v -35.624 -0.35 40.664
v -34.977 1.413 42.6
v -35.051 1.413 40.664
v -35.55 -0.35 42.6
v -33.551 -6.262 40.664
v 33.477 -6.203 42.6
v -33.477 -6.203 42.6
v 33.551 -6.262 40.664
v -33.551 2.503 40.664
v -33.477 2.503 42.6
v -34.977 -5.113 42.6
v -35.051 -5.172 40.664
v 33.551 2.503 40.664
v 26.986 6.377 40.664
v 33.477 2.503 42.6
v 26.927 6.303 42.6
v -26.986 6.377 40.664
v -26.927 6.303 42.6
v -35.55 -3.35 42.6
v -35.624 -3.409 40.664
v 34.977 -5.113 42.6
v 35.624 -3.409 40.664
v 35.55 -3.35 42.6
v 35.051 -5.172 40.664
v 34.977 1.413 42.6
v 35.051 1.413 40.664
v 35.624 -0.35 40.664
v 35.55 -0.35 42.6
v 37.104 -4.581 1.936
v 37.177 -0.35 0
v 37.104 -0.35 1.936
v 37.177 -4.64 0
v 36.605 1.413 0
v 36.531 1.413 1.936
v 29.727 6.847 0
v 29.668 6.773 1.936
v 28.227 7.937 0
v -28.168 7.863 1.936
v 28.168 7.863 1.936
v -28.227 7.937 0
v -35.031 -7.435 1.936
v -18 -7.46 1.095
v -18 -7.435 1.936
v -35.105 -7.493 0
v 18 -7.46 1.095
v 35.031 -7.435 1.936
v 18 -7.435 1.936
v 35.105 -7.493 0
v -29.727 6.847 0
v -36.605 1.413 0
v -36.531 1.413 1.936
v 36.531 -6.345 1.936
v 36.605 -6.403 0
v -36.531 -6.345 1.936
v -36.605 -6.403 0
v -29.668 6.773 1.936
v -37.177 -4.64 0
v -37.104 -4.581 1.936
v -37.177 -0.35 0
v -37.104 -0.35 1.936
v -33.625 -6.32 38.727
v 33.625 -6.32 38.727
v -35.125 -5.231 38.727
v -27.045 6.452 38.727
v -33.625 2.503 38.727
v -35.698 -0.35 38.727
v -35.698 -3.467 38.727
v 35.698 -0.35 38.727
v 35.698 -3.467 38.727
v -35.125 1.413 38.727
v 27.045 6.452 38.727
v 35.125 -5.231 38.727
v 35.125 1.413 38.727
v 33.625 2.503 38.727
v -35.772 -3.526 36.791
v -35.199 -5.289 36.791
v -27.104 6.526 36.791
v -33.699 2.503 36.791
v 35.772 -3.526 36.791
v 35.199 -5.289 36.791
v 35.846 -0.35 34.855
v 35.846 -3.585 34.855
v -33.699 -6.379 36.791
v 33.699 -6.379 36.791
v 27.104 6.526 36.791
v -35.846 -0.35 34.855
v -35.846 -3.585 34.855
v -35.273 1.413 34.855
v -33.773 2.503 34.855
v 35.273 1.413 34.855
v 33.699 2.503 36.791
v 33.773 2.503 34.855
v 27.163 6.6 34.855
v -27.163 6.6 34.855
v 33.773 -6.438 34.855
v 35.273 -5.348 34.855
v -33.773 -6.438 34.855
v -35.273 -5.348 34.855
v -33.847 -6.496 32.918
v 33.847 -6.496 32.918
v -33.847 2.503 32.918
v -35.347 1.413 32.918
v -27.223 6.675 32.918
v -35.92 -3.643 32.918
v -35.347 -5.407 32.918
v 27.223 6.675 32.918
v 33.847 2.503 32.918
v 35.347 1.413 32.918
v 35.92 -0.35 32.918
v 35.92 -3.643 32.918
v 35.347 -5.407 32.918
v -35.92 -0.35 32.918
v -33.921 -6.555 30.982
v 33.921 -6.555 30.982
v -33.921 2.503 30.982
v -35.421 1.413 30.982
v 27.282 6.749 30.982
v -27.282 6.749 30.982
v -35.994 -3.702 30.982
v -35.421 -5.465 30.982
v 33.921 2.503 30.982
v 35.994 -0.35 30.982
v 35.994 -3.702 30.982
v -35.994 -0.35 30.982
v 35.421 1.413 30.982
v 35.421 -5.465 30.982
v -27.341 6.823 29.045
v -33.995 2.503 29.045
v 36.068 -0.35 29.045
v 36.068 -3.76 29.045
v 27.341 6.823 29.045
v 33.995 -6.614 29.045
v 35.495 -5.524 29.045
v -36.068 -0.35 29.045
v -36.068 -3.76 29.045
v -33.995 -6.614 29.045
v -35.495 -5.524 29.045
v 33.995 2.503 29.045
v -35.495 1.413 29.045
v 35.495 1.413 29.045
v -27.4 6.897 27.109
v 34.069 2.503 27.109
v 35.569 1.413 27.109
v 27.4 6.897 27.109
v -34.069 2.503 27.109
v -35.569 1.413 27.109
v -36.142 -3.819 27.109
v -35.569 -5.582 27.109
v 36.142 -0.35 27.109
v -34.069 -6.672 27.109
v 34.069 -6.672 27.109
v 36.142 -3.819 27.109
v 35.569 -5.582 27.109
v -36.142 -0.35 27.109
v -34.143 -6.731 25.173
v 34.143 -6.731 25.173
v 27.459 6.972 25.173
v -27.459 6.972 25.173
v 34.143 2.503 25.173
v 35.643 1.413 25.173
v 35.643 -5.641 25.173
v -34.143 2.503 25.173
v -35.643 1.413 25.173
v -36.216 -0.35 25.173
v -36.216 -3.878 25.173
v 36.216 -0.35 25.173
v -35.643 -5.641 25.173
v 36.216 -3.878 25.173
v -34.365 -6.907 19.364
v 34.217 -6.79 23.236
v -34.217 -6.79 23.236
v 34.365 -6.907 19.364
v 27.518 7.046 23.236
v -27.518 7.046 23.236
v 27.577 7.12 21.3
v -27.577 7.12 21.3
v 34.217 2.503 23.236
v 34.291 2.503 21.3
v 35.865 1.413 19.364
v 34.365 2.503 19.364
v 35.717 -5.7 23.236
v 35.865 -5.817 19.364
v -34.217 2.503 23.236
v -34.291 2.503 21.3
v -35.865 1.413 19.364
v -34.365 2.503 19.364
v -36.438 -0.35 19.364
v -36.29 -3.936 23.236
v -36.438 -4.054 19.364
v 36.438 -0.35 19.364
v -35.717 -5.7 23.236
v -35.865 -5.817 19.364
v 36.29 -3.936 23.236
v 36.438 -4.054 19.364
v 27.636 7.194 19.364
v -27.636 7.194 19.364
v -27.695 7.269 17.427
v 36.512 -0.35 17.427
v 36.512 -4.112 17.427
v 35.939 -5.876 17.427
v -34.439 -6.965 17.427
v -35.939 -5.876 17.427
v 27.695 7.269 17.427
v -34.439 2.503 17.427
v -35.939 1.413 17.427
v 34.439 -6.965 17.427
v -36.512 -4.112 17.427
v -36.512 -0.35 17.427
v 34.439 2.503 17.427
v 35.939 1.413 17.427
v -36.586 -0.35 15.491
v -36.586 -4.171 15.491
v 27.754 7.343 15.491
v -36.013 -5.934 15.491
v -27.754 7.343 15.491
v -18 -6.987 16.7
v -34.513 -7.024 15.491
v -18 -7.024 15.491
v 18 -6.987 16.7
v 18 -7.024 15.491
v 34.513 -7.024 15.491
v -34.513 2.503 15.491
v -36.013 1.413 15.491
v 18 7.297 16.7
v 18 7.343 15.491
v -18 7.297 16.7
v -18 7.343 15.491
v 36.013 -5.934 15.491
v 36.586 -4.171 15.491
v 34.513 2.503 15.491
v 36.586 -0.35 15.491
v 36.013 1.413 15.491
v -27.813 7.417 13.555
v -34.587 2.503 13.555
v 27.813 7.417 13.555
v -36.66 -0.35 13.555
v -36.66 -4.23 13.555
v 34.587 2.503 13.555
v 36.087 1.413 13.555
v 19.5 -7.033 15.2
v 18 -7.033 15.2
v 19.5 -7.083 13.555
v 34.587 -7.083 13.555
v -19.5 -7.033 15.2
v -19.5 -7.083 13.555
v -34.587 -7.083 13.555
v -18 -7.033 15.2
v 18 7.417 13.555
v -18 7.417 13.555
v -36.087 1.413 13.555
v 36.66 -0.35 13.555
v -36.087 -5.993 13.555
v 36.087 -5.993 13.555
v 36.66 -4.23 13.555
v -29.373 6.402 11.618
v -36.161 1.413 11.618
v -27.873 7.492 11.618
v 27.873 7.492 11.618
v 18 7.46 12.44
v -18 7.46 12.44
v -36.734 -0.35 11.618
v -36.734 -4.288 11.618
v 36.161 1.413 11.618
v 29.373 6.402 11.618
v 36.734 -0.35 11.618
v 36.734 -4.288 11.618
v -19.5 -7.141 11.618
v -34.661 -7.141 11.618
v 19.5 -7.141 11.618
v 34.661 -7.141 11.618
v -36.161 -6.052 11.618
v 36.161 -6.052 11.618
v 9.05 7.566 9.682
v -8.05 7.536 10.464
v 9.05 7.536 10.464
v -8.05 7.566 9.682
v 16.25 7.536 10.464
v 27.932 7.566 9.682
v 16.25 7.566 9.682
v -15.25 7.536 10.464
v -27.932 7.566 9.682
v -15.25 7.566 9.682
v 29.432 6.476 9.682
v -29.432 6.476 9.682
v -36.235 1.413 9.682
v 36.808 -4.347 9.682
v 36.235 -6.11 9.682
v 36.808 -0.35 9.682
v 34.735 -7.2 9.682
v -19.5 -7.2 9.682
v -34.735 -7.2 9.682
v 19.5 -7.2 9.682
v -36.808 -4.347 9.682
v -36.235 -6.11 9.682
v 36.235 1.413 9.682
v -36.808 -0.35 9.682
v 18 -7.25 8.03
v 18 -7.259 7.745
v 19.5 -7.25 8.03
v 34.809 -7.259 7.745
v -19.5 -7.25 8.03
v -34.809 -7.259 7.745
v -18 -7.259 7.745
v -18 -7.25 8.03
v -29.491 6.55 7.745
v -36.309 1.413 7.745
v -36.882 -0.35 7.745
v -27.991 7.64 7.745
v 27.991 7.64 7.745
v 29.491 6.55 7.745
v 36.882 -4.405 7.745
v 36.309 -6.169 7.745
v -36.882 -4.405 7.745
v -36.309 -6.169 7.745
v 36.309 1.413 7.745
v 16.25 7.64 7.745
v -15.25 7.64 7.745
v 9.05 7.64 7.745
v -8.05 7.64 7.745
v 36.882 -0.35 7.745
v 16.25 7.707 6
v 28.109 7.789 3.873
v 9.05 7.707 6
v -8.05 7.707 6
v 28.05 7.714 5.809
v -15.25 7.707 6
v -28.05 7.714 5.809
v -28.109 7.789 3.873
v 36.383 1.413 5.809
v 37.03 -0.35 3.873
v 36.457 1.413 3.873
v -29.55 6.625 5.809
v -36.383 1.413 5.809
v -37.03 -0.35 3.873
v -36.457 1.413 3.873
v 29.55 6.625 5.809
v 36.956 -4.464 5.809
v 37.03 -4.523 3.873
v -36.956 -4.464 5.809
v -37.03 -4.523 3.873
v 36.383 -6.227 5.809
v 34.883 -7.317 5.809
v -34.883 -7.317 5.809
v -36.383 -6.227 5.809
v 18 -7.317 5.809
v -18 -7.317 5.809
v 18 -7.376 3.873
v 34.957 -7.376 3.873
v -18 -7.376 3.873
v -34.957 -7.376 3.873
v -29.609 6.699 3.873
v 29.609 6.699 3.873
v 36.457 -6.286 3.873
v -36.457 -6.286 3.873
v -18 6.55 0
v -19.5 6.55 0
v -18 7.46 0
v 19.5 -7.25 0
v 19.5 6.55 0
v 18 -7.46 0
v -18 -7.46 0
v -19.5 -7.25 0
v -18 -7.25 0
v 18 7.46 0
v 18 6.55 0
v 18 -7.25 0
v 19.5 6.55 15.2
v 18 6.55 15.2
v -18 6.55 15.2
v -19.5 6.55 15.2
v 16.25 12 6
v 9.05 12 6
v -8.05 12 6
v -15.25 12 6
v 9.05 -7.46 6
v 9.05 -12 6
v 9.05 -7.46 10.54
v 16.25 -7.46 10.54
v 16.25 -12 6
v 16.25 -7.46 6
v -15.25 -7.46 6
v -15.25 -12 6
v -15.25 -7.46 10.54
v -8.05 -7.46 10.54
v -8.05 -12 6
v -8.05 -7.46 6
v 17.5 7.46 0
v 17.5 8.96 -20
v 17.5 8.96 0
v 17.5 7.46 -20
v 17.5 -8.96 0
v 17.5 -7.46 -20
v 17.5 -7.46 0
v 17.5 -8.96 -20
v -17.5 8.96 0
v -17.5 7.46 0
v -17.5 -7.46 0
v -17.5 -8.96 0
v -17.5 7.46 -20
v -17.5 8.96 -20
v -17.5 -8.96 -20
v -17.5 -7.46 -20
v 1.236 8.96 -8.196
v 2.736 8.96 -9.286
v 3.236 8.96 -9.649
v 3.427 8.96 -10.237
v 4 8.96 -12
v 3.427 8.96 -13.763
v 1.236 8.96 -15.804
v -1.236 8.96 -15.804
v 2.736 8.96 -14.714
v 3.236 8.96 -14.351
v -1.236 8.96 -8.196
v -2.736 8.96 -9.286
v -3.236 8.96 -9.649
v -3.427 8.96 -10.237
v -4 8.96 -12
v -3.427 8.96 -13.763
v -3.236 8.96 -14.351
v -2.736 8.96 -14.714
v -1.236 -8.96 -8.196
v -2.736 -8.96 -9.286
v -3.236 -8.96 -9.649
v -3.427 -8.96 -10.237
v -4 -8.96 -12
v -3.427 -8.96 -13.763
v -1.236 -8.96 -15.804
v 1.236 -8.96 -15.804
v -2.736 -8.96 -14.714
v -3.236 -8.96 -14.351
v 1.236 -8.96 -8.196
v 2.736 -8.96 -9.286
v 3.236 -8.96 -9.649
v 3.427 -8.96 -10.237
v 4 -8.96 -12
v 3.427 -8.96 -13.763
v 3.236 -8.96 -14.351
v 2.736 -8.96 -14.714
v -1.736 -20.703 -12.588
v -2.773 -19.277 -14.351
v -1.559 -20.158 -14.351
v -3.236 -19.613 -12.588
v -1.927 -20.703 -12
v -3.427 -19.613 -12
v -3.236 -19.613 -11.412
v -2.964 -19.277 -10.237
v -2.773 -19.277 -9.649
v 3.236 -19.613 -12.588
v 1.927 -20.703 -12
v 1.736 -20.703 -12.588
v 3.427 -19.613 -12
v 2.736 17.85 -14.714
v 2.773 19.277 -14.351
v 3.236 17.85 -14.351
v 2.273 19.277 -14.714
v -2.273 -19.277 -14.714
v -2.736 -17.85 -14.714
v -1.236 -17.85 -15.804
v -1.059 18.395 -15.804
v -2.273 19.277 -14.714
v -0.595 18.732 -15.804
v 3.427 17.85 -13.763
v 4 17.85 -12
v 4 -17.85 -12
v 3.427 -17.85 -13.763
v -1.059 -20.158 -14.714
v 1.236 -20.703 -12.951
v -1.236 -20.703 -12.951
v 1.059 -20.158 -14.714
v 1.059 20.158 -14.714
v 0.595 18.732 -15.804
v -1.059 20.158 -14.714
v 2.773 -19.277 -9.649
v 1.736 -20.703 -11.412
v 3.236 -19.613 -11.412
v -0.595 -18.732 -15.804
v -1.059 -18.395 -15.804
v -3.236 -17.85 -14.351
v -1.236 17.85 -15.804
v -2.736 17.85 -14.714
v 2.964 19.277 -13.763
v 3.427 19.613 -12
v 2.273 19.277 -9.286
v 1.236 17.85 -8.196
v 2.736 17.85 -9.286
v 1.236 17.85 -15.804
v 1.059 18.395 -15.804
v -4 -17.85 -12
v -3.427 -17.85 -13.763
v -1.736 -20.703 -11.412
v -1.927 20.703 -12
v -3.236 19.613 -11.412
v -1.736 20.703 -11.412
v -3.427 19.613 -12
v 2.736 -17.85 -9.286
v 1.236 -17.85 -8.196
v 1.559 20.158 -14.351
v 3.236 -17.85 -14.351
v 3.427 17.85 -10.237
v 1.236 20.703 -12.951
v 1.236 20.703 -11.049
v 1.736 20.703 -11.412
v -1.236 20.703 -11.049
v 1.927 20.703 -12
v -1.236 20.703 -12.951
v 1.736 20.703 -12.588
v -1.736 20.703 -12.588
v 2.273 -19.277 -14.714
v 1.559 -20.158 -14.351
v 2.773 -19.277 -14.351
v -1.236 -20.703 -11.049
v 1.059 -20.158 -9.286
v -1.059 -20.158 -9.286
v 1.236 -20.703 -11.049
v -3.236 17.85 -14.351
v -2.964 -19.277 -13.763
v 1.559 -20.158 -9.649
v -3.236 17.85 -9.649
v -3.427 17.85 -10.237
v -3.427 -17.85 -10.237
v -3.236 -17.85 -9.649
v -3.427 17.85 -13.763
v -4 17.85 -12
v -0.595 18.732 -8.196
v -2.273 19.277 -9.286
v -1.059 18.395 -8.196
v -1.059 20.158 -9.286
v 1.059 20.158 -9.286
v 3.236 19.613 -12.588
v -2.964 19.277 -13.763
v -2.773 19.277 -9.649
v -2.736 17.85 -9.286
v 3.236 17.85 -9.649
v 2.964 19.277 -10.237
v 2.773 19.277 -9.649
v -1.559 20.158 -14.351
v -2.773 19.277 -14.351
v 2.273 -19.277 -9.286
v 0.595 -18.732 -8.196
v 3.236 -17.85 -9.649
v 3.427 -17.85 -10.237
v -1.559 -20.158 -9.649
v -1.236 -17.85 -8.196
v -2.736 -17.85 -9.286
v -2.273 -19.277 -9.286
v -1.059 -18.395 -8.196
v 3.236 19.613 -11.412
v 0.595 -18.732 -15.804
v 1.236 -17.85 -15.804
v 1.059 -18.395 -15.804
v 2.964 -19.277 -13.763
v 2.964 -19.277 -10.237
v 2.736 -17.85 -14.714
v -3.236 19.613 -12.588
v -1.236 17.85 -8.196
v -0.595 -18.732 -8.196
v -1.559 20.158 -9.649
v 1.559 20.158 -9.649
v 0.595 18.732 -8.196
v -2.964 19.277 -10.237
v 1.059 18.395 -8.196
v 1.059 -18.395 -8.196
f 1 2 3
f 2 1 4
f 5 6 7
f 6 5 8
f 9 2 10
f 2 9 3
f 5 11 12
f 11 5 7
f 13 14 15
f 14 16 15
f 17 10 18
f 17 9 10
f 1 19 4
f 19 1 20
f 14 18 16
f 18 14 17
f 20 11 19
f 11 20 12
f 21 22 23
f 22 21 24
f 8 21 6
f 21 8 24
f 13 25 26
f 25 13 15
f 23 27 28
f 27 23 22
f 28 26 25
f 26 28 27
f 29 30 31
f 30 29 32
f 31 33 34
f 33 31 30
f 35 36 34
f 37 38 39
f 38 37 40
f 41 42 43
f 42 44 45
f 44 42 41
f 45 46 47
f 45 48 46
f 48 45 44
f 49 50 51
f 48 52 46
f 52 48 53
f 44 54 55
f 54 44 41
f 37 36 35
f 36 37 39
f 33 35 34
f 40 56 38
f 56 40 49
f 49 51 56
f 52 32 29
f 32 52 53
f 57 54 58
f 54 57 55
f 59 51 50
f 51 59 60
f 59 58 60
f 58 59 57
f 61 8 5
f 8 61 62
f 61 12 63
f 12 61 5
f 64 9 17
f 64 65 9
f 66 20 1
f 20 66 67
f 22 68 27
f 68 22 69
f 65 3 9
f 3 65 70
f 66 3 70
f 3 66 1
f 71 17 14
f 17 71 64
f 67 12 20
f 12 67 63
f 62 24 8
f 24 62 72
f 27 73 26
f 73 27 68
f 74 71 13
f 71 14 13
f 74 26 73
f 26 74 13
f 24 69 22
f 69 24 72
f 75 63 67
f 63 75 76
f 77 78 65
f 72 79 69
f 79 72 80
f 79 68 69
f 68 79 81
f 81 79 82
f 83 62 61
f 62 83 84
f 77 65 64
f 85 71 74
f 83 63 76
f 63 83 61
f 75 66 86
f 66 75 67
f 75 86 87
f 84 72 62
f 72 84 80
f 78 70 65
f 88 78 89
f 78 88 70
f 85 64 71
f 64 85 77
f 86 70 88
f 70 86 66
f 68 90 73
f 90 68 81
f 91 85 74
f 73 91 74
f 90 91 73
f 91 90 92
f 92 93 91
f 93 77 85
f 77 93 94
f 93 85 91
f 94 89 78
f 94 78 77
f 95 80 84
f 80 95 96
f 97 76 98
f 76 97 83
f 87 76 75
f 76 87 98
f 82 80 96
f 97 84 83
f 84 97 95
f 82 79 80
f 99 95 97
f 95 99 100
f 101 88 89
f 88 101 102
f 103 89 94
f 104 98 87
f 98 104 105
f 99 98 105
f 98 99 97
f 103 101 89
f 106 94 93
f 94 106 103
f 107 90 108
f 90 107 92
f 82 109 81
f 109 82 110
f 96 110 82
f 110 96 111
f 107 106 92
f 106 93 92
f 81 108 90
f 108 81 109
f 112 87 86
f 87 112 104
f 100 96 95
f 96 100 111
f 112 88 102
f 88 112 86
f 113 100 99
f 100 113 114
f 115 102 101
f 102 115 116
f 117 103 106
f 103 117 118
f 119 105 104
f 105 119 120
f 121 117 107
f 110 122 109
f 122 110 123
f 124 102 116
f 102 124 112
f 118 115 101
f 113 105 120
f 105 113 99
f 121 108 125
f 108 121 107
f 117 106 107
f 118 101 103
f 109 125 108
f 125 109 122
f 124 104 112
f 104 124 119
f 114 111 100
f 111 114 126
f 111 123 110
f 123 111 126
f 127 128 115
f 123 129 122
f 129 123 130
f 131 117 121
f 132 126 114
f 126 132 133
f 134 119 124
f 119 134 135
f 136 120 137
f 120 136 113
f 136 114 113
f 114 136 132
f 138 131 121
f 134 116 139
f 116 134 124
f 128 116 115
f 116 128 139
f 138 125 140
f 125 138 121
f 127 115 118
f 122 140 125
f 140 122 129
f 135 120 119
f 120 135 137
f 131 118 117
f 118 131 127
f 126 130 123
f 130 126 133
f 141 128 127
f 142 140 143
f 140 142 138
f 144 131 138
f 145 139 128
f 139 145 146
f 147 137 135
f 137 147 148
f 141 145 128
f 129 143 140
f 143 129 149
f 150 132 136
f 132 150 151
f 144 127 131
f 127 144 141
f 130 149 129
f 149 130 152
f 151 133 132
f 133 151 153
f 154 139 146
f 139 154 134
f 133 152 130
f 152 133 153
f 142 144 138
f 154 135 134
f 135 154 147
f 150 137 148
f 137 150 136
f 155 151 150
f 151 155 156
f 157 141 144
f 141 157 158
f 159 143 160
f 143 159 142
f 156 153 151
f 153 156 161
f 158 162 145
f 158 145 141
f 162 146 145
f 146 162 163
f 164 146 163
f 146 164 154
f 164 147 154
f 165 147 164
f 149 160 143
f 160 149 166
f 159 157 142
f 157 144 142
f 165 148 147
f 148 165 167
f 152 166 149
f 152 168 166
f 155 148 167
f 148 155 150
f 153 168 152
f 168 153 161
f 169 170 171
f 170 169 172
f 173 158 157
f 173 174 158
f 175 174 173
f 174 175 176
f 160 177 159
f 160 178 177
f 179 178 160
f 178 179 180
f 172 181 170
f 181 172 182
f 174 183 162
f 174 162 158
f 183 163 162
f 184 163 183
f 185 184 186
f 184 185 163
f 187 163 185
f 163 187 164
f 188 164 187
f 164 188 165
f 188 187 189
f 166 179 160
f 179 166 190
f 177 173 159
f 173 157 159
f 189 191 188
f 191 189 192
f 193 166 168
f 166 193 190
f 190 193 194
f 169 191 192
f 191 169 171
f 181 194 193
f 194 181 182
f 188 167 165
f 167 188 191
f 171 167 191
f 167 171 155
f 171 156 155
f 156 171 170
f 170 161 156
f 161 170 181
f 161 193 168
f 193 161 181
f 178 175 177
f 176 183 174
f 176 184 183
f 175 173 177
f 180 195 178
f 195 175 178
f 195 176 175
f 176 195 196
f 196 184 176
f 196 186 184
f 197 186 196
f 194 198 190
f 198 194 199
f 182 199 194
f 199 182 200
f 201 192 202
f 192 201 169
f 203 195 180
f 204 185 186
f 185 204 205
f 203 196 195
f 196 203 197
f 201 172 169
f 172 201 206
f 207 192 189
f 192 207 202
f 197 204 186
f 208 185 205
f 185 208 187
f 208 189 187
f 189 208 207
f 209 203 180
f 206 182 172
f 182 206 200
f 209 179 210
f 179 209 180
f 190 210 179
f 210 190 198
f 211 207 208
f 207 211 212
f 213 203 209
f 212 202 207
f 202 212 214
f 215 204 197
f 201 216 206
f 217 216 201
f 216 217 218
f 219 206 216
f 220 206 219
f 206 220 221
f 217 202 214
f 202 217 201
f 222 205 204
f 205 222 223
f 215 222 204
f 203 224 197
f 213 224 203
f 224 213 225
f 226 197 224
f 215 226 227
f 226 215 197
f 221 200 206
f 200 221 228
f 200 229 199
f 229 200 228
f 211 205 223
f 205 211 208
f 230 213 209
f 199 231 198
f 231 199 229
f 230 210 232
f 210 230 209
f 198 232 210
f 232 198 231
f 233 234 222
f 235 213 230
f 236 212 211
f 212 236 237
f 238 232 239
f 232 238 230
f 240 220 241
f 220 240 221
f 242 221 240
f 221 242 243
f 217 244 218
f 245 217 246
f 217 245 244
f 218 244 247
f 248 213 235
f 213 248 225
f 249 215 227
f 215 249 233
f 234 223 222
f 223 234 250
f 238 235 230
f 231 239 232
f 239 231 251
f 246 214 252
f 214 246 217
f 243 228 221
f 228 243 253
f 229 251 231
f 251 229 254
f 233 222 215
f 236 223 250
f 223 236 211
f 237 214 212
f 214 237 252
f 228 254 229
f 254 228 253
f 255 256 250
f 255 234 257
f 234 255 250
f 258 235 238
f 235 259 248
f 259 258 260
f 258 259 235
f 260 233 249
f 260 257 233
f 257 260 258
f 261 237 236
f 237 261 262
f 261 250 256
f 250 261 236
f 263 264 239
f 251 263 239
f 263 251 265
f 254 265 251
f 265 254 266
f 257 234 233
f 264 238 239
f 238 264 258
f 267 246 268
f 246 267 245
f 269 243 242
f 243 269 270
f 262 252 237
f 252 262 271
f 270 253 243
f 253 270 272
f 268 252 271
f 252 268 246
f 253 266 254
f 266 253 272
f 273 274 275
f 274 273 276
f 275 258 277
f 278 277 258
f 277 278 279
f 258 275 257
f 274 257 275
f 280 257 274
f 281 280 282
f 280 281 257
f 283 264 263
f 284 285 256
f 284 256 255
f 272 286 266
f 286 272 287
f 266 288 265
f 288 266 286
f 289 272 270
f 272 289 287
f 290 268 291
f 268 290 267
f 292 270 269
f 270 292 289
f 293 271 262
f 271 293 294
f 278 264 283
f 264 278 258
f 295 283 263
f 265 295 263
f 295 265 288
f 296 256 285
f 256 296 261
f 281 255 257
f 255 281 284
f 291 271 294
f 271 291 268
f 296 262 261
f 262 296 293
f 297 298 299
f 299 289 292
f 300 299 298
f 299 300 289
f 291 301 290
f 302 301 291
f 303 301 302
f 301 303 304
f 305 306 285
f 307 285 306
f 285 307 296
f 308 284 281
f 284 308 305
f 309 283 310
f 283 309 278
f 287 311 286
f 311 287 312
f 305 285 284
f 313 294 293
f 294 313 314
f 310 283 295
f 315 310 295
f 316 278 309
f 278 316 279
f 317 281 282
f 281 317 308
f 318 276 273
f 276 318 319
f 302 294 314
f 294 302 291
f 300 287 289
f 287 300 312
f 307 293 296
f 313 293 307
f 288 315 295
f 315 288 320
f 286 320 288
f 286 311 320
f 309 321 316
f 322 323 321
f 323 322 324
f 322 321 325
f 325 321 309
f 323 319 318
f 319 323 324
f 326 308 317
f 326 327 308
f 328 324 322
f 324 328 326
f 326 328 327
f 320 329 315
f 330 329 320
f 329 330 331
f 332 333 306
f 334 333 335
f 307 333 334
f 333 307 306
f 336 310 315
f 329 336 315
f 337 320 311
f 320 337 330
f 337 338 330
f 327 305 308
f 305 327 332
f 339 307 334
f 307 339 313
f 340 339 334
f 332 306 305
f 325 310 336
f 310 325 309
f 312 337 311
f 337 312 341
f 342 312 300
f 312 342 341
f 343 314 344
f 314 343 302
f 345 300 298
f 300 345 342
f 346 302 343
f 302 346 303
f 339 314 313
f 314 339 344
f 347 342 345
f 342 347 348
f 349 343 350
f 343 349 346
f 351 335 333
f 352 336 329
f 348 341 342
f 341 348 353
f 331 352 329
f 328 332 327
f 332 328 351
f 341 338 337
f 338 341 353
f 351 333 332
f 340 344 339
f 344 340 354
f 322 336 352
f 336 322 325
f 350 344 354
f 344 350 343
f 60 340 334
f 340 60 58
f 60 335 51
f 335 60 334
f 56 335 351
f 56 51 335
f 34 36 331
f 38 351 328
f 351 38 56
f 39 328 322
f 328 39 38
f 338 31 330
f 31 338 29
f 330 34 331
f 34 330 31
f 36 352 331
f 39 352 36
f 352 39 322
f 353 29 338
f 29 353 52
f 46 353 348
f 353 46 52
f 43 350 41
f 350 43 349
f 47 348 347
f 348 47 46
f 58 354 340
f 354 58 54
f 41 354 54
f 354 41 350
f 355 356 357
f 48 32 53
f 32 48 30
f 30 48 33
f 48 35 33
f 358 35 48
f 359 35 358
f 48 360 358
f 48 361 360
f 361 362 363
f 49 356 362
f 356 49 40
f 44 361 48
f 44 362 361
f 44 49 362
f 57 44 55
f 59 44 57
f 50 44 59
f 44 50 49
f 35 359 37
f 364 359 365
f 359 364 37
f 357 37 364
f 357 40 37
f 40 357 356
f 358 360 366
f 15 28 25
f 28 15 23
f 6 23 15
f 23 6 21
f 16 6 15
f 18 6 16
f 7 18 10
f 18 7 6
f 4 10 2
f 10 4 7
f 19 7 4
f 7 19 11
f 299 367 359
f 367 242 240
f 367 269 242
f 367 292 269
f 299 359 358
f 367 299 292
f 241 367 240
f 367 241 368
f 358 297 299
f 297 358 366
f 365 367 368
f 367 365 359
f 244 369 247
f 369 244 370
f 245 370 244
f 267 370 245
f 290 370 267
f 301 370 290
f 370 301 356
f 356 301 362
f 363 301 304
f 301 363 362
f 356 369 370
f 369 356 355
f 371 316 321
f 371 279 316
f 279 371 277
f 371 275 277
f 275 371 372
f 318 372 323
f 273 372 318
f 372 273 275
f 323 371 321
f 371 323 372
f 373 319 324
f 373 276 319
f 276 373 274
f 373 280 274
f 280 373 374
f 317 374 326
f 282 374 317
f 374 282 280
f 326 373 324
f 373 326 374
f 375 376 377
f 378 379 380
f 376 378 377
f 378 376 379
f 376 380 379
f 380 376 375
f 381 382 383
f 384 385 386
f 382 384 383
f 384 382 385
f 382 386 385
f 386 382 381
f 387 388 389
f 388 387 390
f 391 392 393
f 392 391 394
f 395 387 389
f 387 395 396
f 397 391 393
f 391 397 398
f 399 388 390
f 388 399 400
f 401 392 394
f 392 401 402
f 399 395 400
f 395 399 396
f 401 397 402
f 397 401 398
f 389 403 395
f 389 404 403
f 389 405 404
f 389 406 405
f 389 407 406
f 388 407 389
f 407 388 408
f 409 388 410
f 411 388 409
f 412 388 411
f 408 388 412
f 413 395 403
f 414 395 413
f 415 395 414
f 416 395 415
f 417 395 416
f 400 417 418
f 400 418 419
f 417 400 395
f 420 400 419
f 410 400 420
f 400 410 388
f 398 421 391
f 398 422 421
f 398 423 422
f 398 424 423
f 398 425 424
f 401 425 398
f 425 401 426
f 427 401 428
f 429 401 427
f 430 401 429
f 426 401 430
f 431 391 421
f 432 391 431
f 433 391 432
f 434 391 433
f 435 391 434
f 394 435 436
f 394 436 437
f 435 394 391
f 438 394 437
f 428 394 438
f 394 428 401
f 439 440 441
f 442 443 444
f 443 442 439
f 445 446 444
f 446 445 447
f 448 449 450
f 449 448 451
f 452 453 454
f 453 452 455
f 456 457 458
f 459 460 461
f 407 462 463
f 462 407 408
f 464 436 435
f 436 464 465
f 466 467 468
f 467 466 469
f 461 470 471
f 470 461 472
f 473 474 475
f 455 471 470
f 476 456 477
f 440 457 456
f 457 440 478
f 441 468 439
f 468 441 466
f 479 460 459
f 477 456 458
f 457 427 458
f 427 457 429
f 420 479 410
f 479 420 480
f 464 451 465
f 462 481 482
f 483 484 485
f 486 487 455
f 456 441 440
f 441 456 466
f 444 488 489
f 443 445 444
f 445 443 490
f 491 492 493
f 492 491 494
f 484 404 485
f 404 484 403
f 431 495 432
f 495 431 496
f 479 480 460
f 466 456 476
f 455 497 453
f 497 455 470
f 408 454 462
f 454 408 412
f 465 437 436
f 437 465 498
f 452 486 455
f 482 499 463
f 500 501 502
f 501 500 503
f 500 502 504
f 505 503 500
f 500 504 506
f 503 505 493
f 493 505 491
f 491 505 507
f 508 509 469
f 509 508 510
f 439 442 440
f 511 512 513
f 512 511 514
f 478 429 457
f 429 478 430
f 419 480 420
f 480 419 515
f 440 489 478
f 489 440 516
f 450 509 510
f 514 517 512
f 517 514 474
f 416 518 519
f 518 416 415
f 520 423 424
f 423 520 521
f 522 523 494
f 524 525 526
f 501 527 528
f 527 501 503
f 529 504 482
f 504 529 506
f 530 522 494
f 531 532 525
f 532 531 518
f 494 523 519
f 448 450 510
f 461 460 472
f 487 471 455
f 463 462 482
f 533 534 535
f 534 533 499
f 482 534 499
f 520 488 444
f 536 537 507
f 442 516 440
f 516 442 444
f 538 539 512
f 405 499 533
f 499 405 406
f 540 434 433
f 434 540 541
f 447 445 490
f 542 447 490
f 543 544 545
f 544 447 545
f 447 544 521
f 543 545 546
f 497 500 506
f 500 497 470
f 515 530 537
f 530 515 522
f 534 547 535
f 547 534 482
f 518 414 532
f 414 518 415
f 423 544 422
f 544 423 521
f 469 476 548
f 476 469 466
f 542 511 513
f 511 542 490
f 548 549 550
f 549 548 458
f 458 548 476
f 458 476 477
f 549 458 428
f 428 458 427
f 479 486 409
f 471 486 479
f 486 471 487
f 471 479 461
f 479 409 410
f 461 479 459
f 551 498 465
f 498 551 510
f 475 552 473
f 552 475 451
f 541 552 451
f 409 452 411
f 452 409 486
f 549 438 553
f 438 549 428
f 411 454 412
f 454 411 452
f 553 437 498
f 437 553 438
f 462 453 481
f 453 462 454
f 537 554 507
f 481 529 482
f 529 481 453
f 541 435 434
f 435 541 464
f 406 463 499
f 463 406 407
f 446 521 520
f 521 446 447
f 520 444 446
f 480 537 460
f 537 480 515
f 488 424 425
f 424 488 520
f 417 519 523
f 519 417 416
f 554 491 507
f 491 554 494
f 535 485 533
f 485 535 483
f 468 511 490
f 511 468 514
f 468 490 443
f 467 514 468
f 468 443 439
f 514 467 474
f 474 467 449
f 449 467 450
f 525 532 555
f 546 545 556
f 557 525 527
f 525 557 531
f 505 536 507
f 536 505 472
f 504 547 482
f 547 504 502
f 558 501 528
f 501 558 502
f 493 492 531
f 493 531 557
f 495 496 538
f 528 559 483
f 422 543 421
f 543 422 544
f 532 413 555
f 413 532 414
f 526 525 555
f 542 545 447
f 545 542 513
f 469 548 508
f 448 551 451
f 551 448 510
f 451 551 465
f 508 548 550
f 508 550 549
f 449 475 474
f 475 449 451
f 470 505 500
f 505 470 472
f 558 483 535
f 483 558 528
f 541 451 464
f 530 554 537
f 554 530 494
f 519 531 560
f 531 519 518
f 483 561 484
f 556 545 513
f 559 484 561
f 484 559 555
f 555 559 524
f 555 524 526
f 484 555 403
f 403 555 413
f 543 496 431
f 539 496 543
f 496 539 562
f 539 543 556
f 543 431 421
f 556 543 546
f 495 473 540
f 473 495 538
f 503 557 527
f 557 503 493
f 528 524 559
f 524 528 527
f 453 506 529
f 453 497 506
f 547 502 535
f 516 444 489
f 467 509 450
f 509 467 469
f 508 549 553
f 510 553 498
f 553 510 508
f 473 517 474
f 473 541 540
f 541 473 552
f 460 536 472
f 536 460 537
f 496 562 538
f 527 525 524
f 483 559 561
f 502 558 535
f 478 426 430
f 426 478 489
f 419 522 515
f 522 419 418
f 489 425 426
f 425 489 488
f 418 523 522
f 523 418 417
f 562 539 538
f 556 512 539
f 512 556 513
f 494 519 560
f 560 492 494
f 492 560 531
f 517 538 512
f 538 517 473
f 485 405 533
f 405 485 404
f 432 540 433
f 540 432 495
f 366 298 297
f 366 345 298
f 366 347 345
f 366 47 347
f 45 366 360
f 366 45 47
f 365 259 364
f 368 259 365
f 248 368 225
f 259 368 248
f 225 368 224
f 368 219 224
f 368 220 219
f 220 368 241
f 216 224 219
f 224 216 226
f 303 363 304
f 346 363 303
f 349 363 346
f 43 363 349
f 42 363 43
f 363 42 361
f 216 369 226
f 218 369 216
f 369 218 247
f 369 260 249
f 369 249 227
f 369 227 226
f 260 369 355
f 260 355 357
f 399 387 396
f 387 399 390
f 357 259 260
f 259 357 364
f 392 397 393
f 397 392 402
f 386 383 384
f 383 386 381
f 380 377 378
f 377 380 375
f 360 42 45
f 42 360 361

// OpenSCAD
largeur_socle = 30.7;
longueur_socle = 86.7;
hauteur_socle = 100.3;
epaisseur_socle = 3;
largeur_fixation = 27.9;
longueur_fixation = 84.5;
hauteur_fixation = 17.8;
profondeur_fixation = 11;
epaisseur_fixation = 2;
cran_longueur_1 = 9.9;
espace_1_2 = 3;
cran_longueur_2 = 7.15;
espace_2_3 = 3;
cran_longueur_3 = 39;
espace_3_4 = 3;
cran_longueur_4 = 7.15;
espace_4_5 = 3;
cran_longueur_5 = 9.9;
cran_largeur_1 = 6.3;
espace_largeur_1_2 = 3.13;
cran_largeur_2 = 3.8;
espace_largeur_2_3 = 3.13;
cran_largeur_3 = 11.8;
longueur_encoche = 8.2;
hauteur_encoche = 5.6;
espace_encoche_x = 3.25;
espace_encoche_y = 5.5;
longueur_cran = 10;
radius = 3;
marge = 0.5;
detail = 10;
longueur_max_tige = 71.1;
longueur_min_tige = 58;
largeur_max_tige = 12.8;
largeur_min_tige = 6;
separation_accroche = 4;
longueur_accroche = cran_longueur_3-separation_accroche;
largeur_accroche = 1.4*largeur_max_tige;
hauteur_accroche = 20;

module socle_etape1(longueur, largeur, hauteur, radius){
	difference(){
		minkowski(){
			cube([longueur-2*radius, largeur-2*radius, hauteur], center = true);
			sphere (radius, $fn=detail);
		}
		translate([0,0,(hauteur+radius)/2]) cube([longueur, largeur, radius], center = true);
		translate([0,0,-(hauteur+radius)/2]) cube([longueur, largeur, radius], center = true);
	}
}

module socle_etape2(longueur, largeur, hauteur, radius, epaisseur){
	difference(){
		socle_etape1(longueur, largeur, hauteur, radius);
		socle_etape1(longueur-2*epaisseur, largeur-2*epaisseur, hauteur+1, radius);
	}
}

module fixation_bas(){
	position_creux_y = -(hauteur_fixation-profondeur_fixation)/2-marge/2;
	position_espace_1_x = -longueur_fixation/2+cran_longueur_1+espace_1_2/2;
	position_espace_2_x = position_espace_1_x+espace_1_2/2+cran_longueur_2+espace_2_3/2;
	position_espace_3_x = position_espace_2_x+espace_2_3/2+cran_longueur_3+espace_3_4/2;
	position_espace_4_x = position_espace_3_x+espace_3_4/2+cran_longueur_4+espace_4_5/2;
	
	position_espace_1_y = -largeur_fixation/2+cran_largeur_1+espace_largeur_1_2/2;
	position_espace_2_y = position_espace_1_y+espace_largeur_1_2/2+cran_largeur_2+espace_largeur_2_3/2;

	position_encoche_1_x = position_espace_2_x+espace_2_3/2+espace_encoche_x+longueur_encoche/2;
	position_encoche_2_x = position_espace_3_x-espace_3_4/2-espace_encoche_x-longueur_encoche/2;
	position_encoche_y = -(hauteur_fixation/2-hauteur_encoche/2-espace_encoche_y);

	difference(){
		socle_etape2(longueur_fixation, largeur_fixation, hauteur_fixation, radius, epaisseur_fixation);
		translate([position_espace_1_x,largeur_fixation/2,position_creux_y]) cube([espace_1_2,10,profondeur_fixation+marge], center = true);
		translate([position_espace_2_x,largeur_fixation/2,position_creux_y]) cube([espace_2_3,10,profondeur_fixation+marge], center = true);
		translate([position_espace_3_x,largeur_fixation/2,position_creux_y]) cube([espace_3_4,10,profondeur_fixation+marge], center = true);
		translate([position_espace_4_x,largeur_fixation/2,position_creux_y]) cube([espace_4_5,10,profondeur_fixation+marge], center = true);

		translate([longueur_fixation/2,position_espace_1_y,position_creux_y]) cube([10,espace_largeur_1_2,profondeur_fixation+marge], center = true);
		translate([longueur_fixation/2,position_espace_2_y,position_creux_y]) cube([10,espace_largeur_2_3,profondeur_fixation+marge], center = true);

		translate([position_espace_1_x,-largeur_fixation/2,position_creux_y]) cube([espace_1_2,10,profondeur_fixation+marge], center = true);
		translate([position_espace_2_x,-largeur_fixation/2,position_creux_y]) cube([espace_2_3,10,profondeur_fixation+marge], center = true);
		translate([position_espace_3_x,-largeur_fixation/2,position_creux_y]) cube([espace_3_4,10,profondeur_fixation+marge], center = true);
		translate([position_espace_4_x,-largeur_fixation/2,position_creux_y]) cube([espace_4_5,10,profondeur_fixation+marge], center = true);

		translate([-longueur_fixation/2,position_espace_1_y,position_creux_y]) cube([10,espace_largeur_1_2,profondeur_fixation+marge], center = true);
		translate([-longueur_fixation/2,position_espace_2_y,position_creux_y]) cube([10,espace_largeur_2_3,profondeur_fixation+marge], center = true);

		translate([position_encoche_1_x, -largeur_fixation/2,position_encoche_y]) cube([longueur_encoche,10,hauteur_encoche], center = true);
		translate([position_encoche_2_x, -largeur_fixation/2,position_encoche_y]) cube([longueur_encoche,10,hauteur_encoche], center = true);

		translate([position_encoche_1_x, largeur_fixation/2,position_encoche_y]) cube([longueur_encoche,10,hauteur_encoche], center = true);
		translate([position_encoche_2_x, largeur_fixation/2,position_encoche_y]) cube([longueur_encoche,10,hauteur_encoche], center = true);
	}
		
}

module fixation_haut(){
	position_creux_z = hauteur_fixation-profondeur_fixation/2;
	position_espace_1_x = -longueur_fixation/2+cran_longueur_1+espace_1_2/2;
	position_espace_2_x = position_espace_1_x+espace_1_2/2+cran_longueur_2+espace_2_3/2;
	position_espace_3_x = position_espace_2_x+espace_2_3/2+cran_longueur_3+espace_3_4/2;
	position_espace_4_x = position_espace_3_x+espace_3_4/2+cran_longueur_4+espace_4_5/2;
	position_espace_1_y = -largeur_fixation/2+cran_largeur_1+espace_largeur_1_2/2;
	position_espace_2_y = position_espace_1_y+espace_largeur_1_2/2+cran_largeur_2+espace_largeur_2_3/2;
	
	difference(){
		socle_etape1(longueur_socle-2*epaisseur_socle, largeur_socle-2*epaisseur_socle, 12, radius);
		translate([0,0,-(largeur_socle-2*epaisseur_socle)/2]) rotate([45,0,0]) cube([longueur_socle-2*epaisseur_socle, largeur_socle-2*epaisseur_socle, largeur_socle-2*epaisseur_socle], center = true);
		cube([longueur_accroche+2*marge, largeur_accroche+2*marge, hauteur_accroche], center = true);
	}

	translate([position_espace_1_x,(largeur_fixation-longueur_cran)/2,position_creux_z]) cube([espace_1_2-2*marge,longueur_cran,profondeur_fixation-marge], center = true);
	translate([position_espace_2_x,(largeur_fixation-longueur_cran)/2,position_creux_z]) cube([espace_2_3-2*marge,longueur_cran,profondeur_fixation-marge], center = true);
	translate([position_espace_3_x,(largeur_fixation-longueur_cran)/2,position_creux_z]) cube([espace_3_4-2*marge,longueur_cran,profondeur_fixation-marge], center = true);
	translate([position_espace_4_x,(largeur_fixation-longueur_cran)/2,position_creux_z]) cube([espace_4_5-2*marge,longueur_cran,profondeur_fixation-marge], center = true);

	translate([position_espace_1_x,-(largeur_fixation-longueur_cran)/2,position_creux_z]) cube([espace_1_2-2*marge,longueur_cran,profondeur_fixation-marge], center = true);
	translate([position_espace_2_x,-(largeur_fixation-longueur_cran)/2,position_creux_z]) cube([espace_2_3-2*marge,longueur_cran,profondeur_fixation-marge], center = true);
	translate([position_espace_3_x,-(largeur_fixation-longueur_cran)/2,position_creux_z]) cube([espace_3_4-2*marge,longueur_cran,profondeur_fixation-marge], center = true);
	translate([position_espace_4_x,-(largeur_fixation-longueur_cran)/2,position_creux_z]) cube([espace_4_5-2*marge,longueur_cran,profondeur_fixation-marge], center = true);

	translate([(longueur_fixation-longueur_cran)/2,position_espace_1_y,position_creux_z]) cube([longueur_cran,espace_largeur_1_2-2*marge,profondeur_fixation-marge], center = true);
	translate([(longueur_fixation-longueur_cran)/2,position_espace_2_y,position_creux_z]) cube([longueur_cran,espace_largeur_2_3-2*marge,profondeur_fixation-marge], center = true);

	translate([-(longueur_fixation-longueur_cran)/2,position_espace_1_y,position_creux_z]) cube([longueur_cran,espace_largeur_1_2-2*marge,profondeur_fixation-marge], center = true);
	translate([-(longueur_fixation-longueur_cran)/2,position_espace_2_y,position_creux_z]) cube([longueur_cran,espace_largeur_2_3-2*marge,profondeur_fixation-marge], center = true);

	rotate([0,0,0]) translate([0,0,hauteur_fixation-profondeur_fixation]) tige();
	cube([longueur_accroche, largeur_accroche, hauteur_accroche], center = true);
}

module tige(){
	position_crochet_x = (cran_longueur_3-2*espace_encoche_x-longueur_encoche)/2;
	difference(){
		union(){
			translate([0,-0.35,(30.8+hauteur_fixation-2*radius)/2])
			rotate([180, 0, 0])
			difference(){
				minkowski(){
					linear_extrude(height=(30.8+hauteur_fixation-2*radius), center=true, convexity = 10, twist = 0, scale=[1.05,1.43]) 
					polygon(points=[
						[(longueur_max_tige/2-radius),(largeur_min_tige-radius)],
						[-(longueur_max_tige/2-radius),(largeur_min_tige-radius)],
						[-(longueur_max_tige/2-radius),0],
						[-(longueur_min_tige/2-radius),-(largeur_max_tige-largeur_min_tige-radius)],
						[(longueur_min_tige/2-radius),-(largeur_max_tige-largeur_min_tige-radius)],
						[(longueur_max_tige/2-radius),0]
						], paths=[[0,1,2,3,4,5]]);
					sphere (radius, $fn=detail);
				}
				translate([0,0,(30.8+hauteur_fixation-radius)/2]) cube([2*longueur_max_tige, 2*largeur_max_tige, radius], center = true);
				translate([0,0,-(30.8+hauteur_fixation-radius)/2]) cube([2*longueur_max_tige, 2*largeur_max_tige, radius], center = true);
				translate([cran_longueur_3/2-1, 0,-(espace_encoche_y+2*hauteur_encoche-(30.8+hauteur_fixation-radius))/2]) cube([2,largeur_max_tige+2*marge,espace_encoche_y+2*hauteur_encoche], center = true);
				translate([1-cran_longueur_3/2, 0,-(espace_encoche_y+2*hauteur_encoche-(30.8+hauteur_fixation-radius))/2]) cube([2,largeur_max_tige+2*marge,espace_encoche_y+2*hauteur_encoche], center = true);
			}

			translate([position_crochet_x+marge,largeur_max_tige/2,espace_encoche_y+marge]) color("pink") crochet();
			translate([-position_crochet_x+marge,largeur_max_tige/2,espace_encoche_y+marge]) color("pink") crochet();	
			translate([position_crochet_x+marge,-largeur_max_tige/2,espace_encoche_y+marge]) rotate([0,0,180]) color("pink") crochet();
			translate([-position_crochet_x+marge,-largeur_max_tige/2,espace_encoche_y+marge]) rotate([0,0,180]) color("pink") crochet();
			translate([0,0,-hauteur_accroche/2]) cube([longueur_accroche, largeur_accroche, hauteur_accroche], center = true);
			translate([0,0,2*(radius+1)-hauteur_accroche])
			minkowski(){
				rotate([90,0,0]) cylinder(h=largeur_socle+5, r=1, $fn=detail, center=true);
				sphere (radius, $fn=detail);
			}
		}
		translate([0,0,-hauteur_accroche/2+espace_encoche_y/2+hauteur_encoche]) cube([longueur_accroche+2*marge, largeur_accroche-epaisseur_socle, hauteur_accroche+espace_encoche_y+2*hauteur_encoche], center = true);			
	}	
}

module crochet(){
	rotate([0,-90,0])
	linear_extrude(height=longueur_encoche-2*marge, center=true, convexity = 10, twist = 0) 
			polygon(points=[
				[0,0],
				[0,hauteur_encoche],
				[hauteur_encoche,0]
				], paths=[[0,1,2]]);
}

module support_complet(){
	difference(){
		socle_etape2(longueur_socle, largeur_socle, hauteur_socle, radius, epaisseur_socle);
		//translate([0,0,hauteur_socle/2-hauteur_fixation/2]) color("red") fixation_bas();
		translate([0,0,hauteur_socle/2-hauteur_fixation/2+marge/2]) color("red") socle_etape2(longueur_fixation, largeur_fixation, hauteur_fixation+marge, radius, epaisseur_fixation);
		translate([0,0,hauteur_socle/2-hauteur_fixation/2+marge/2 - hauteur_accroche]) rotate([90,0,0]) cylinder(h=largeur_socle+5, r=2+radius, $fn=detail, center=true);
	}
	translate([0,0,-(hauteur_socle+hauteur_fixation)/2]) fixation_bas();	
	translate([0,0,hauteur_socle/2-6-hauteur_fixation]) fixation_haut();
	//translate([0,10,hauteur_socle/2-hauteur_fixation/2])color("red") fixation_bas();	
	
	
}

tige();
//support_complet();
